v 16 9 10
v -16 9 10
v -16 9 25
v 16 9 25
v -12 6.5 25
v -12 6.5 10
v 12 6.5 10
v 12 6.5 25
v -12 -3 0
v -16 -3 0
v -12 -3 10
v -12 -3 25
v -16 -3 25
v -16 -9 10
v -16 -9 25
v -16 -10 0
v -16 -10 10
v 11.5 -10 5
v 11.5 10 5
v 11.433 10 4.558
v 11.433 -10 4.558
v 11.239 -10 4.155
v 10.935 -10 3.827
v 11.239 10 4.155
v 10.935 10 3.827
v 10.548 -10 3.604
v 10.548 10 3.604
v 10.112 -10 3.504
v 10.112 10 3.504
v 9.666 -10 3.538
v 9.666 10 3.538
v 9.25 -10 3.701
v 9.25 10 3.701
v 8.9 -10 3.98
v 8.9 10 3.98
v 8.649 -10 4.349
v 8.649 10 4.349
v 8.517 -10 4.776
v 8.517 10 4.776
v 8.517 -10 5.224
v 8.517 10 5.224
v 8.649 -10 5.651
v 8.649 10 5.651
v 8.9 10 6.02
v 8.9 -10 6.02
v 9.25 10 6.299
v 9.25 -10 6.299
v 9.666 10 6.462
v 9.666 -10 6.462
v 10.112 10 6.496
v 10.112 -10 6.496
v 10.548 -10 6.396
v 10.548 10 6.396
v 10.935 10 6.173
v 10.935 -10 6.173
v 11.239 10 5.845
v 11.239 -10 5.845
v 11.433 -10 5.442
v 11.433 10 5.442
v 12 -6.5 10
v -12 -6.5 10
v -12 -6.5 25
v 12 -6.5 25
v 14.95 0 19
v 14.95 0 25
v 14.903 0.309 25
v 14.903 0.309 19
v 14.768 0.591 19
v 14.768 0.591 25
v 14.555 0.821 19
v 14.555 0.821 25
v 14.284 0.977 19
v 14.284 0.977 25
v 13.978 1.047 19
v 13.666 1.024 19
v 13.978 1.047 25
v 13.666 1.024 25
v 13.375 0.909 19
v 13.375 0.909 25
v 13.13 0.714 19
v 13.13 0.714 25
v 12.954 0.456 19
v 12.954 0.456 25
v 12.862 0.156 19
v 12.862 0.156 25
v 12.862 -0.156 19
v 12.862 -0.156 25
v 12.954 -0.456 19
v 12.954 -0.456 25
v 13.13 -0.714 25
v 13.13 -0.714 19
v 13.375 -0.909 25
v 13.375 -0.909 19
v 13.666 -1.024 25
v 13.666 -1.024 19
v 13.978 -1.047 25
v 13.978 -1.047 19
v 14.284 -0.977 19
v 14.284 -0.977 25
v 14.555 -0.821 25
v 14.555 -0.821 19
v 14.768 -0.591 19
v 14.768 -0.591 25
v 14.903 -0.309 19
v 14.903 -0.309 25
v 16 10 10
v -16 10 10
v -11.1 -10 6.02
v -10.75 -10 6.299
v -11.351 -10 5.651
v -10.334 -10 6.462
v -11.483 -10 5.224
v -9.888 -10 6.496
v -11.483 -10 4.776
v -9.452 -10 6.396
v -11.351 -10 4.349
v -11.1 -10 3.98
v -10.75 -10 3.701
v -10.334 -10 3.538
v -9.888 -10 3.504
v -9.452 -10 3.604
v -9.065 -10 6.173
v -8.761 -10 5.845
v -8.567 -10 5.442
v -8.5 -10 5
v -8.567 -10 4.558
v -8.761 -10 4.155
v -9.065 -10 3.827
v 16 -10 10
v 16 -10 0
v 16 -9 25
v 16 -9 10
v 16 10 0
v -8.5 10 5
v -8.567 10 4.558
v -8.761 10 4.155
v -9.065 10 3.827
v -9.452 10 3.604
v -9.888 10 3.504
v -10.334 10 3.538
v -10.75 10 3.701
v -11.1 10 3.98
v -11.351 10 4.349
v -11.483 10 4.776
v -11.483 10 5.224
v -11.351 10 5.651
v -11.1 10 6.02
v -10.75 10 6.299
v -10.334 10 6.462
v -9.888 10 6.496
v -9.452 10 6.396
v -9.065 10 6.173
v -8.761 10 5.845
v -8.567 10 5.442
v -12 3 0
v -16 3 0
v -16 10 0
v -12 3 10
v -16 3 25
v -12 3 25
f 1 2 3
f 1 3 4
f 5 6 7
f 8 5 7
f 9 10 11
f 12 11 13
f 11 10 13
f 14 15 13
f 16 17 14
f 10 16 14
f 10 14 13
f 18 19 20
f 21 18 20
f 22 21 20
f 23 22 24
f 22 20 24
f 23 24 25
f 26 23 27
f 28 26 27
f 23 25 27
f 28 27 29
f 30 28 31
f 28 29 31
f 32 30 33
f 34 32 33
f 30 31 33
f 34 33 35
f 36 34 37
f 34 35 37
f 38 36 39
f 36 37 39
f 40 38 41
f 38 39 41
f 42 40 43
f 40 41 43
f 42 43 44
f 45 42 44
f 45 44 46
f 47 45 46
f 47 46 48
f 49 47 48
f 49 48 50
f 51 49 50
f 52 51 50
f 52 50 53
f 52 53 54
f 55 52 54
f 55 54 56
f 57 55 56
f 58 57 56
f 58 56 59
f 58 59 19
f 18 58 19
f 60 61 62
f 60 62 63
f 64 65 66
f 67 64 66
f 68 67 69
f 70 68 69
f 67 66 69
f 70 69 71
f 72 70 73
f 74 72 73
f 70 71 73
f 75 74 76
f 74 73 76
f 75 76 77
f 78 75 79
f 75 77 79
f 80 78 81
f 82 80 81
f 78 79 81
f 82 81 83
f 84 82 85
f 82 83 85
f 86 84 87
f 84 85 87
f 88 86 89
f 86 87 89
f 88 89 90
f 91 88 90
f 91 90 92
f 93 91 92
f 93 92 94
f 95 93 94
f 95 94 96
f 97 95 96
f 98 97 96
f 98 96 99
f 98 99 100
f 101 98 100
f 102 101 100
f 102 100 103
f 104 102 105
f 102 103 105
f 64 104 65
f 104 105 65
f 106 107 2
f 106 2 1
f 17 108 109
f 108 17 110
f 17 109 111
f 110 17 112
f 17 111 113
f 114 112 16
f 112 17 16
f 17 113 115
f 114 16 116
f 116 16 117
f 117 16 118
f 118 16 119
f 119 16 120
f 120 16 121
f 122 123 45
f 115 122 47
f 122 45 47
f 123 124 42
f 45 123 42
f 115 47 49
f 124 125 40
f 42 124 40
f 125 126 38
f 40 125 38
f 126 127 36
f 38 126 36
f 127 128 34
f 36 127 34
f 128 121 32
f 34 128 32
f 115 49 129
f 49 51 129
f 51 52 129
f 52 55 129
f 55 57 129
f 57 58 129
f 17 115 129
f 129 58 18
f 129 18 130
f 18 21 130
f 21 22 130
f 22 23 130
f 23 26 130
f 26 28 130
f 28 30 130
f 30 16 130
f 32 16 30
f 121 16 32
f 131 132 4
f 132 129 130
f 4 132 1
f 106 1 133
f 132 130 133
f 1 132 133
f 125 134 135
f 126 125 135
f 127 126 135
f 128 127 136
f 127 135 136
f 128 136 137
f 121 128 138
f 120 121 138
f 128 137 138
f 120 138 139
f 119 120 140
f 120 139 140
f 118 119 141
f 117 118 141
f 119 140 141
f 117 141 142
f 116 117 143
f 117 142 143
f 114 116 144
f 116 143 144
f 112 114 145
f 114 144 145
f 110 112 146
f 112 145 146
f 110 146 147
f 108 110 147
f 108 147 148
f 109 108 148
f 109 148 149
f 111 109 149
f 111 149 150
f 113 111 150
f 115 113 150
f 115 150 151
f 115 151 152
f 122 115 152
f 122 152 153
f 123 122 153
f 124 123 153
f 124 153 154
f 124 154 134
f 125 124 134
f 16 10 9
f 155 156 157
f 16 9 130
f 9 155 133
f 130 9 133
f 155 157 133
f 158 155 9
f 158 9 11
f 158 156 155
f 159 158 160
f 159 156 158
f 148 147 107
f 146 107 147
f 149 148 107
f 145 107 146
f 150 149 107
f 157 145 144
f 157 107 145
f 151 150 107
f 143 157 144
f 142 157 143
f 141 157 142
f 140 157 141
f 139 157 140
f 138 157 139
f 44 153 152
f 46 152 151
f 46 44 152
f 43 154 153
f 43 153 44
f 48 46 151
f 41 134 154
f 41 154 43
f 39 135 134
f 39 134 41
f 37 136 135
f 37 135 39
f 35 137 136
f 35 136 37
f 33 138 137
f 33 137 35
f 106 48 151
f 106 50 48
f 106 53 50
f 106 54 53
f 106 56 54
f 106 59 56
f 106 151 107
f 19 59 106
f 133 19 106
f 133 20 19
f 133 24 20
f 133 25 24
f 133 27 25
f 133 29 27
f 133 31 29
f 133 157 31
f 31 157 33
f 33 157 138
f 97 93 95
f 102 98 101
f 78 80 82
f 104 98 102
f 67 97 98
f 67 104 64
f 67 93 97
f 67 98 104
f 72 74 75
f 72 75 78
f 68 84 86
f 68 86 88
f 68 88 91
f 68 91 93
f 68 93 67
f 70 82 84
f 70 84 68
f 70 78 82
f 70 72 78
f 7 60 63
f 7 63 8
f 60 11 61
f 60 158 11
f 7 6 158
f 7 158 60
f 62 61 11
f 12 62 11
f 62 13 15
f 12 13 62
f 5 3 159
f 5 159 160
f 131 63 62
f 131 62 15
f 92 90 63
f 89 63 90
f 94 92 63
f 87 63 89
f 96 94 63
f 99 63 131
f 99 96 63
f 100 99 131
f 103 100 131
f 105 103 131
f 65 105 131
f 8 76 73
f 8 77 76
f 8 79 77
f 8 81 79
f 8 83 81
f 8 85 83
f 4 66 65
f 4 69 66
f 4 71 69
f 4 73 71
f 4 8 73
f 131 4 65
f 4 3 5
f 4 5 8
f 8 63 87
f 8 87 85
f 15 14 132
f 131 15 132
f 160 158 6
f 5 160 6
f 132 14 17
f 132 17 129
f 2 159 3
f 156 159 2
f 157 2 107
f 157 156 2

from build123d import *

# Parameters (mm, degrees)
ESQUISSE15_W             = 32
ESQUISSE15_H             = 20
BOSS_EXTRU_1_DEPTH       = 10
ESQUISSE16_W             = 32
ESQUISSE16_H             = 18
ESQUISSE16_W_2           = 24
ESQUISSE16_H_2           = 13
BOSS_EXTRU_2_DEPTH       = 15
ESQUISSE17_W             = 25
ESQUISSE17_H             = 6
ENL_V_MAT_EXTRU_8_DEPTH  = 4
ESQUISSE19_R             = 1.05
ENL_V_MAT_EXTRU_10_DEPTH = 6
ENL_V_MAT_EXTRU_11_REACH = 22
ESQUISSE20_R             = 1.5


with BuildPart() as part:
    # Esquisse15 → Boss.-Extru.1 (new body)
    with BuildSketch(Plane.XY):
        Rectangle(ESQUISSE15_W, ESQUISSE15_H)
    extrude(amount=BOSS_EXTRU_1_DEPTH)

    # Esquisse16 → Boss.-Extru.2 (add)
    with BuildSketch(Plane.XY.offset(10)):
        Rectangle(ESQUISSE16_W, ESQUISSE16_H)
        Rectangle(ESQUISSE16_W_2, ESQUISSE16_H_2, mode=Mode.SUBTRACT)
    extrude(amount=BOSS_EXTRU_2_DEPTH)

    # Esquisse17 → Enlèv. mat.-Extru.8 (cut)
    with BuildSketch(Plane.ZY.offset(16)):
        with Locations((12.5, 0)):
            Rectangle(ESQUISSE17_W, ESQUISSE17_H)
    extrude(amount=-ENL_V_MAT_EXTRU_8_DEPTH, mode=Mode.SUBTRACT)

    # Esquisse19 → Enlèv. mat.-Extru.10 (cut)
    with BuildSketch(Plane.XY.offset(25)):
        with Locations((13.9, 0)):
            Circle(ESQUISSE19_R)
    extrude(amount=-ENL_V_MAT_EXTRU_10_DEPTH, mode=Mode.SUBTRACT)

    # Esquisse20 → Enlèv. mat.-Extru.11 (cut, up to next)
    with BuildSketch(Plane(origin=(0, 10, 0), x_dir=(1, 0, 0), z_dir=(0, 1, 0)), mode=Mode.PRIVATE) as enl_v_mat_extru_11_sk1:
        with Locations((-10, -5)):
            Circle(ESQUISSE20_R)
    enl_v_mat_extru_11_tool1 = extrude(enl_v_mat_extru_11_sk1.sketch, amount=-ENL_V_MAT_EXTRU_11_REACH, mode=Mode.PRIVATE) & part.part
    add(enl_v_mat_extru_11_tool1.solids().sort_by_distance((-10, 10, 5))[0], mode=Mode.SUBTRACT)
    # Esquisse20 → Enlèv. mat.-Extru.11 (cut, up to next)
    with BuildSketch(Plane(origin=(0, 10, 0), x_dir=(1, 0, 0), z_dir=(0, 1, 0)), mode=Mode.PRIVATE) as enl_v_mat_extru_11_sk2:
        with Locations((10, -5)):
            Circle(ESQUISSE20_R)
    enl_v_mat_extru_11_tool2 = extrude(enl_v_mat_extru_11_sk2.sketch, amount=-ENL_V_MAT_EXTRU_11_REACH, mode=Mode.PRIVATE) & part.part
    add(enl_v_mat_extru_11_tool2.solids().sort_by_distance((10, 10, 5))[0], mode=Mode.SUBTRACT)


solid = part.part
